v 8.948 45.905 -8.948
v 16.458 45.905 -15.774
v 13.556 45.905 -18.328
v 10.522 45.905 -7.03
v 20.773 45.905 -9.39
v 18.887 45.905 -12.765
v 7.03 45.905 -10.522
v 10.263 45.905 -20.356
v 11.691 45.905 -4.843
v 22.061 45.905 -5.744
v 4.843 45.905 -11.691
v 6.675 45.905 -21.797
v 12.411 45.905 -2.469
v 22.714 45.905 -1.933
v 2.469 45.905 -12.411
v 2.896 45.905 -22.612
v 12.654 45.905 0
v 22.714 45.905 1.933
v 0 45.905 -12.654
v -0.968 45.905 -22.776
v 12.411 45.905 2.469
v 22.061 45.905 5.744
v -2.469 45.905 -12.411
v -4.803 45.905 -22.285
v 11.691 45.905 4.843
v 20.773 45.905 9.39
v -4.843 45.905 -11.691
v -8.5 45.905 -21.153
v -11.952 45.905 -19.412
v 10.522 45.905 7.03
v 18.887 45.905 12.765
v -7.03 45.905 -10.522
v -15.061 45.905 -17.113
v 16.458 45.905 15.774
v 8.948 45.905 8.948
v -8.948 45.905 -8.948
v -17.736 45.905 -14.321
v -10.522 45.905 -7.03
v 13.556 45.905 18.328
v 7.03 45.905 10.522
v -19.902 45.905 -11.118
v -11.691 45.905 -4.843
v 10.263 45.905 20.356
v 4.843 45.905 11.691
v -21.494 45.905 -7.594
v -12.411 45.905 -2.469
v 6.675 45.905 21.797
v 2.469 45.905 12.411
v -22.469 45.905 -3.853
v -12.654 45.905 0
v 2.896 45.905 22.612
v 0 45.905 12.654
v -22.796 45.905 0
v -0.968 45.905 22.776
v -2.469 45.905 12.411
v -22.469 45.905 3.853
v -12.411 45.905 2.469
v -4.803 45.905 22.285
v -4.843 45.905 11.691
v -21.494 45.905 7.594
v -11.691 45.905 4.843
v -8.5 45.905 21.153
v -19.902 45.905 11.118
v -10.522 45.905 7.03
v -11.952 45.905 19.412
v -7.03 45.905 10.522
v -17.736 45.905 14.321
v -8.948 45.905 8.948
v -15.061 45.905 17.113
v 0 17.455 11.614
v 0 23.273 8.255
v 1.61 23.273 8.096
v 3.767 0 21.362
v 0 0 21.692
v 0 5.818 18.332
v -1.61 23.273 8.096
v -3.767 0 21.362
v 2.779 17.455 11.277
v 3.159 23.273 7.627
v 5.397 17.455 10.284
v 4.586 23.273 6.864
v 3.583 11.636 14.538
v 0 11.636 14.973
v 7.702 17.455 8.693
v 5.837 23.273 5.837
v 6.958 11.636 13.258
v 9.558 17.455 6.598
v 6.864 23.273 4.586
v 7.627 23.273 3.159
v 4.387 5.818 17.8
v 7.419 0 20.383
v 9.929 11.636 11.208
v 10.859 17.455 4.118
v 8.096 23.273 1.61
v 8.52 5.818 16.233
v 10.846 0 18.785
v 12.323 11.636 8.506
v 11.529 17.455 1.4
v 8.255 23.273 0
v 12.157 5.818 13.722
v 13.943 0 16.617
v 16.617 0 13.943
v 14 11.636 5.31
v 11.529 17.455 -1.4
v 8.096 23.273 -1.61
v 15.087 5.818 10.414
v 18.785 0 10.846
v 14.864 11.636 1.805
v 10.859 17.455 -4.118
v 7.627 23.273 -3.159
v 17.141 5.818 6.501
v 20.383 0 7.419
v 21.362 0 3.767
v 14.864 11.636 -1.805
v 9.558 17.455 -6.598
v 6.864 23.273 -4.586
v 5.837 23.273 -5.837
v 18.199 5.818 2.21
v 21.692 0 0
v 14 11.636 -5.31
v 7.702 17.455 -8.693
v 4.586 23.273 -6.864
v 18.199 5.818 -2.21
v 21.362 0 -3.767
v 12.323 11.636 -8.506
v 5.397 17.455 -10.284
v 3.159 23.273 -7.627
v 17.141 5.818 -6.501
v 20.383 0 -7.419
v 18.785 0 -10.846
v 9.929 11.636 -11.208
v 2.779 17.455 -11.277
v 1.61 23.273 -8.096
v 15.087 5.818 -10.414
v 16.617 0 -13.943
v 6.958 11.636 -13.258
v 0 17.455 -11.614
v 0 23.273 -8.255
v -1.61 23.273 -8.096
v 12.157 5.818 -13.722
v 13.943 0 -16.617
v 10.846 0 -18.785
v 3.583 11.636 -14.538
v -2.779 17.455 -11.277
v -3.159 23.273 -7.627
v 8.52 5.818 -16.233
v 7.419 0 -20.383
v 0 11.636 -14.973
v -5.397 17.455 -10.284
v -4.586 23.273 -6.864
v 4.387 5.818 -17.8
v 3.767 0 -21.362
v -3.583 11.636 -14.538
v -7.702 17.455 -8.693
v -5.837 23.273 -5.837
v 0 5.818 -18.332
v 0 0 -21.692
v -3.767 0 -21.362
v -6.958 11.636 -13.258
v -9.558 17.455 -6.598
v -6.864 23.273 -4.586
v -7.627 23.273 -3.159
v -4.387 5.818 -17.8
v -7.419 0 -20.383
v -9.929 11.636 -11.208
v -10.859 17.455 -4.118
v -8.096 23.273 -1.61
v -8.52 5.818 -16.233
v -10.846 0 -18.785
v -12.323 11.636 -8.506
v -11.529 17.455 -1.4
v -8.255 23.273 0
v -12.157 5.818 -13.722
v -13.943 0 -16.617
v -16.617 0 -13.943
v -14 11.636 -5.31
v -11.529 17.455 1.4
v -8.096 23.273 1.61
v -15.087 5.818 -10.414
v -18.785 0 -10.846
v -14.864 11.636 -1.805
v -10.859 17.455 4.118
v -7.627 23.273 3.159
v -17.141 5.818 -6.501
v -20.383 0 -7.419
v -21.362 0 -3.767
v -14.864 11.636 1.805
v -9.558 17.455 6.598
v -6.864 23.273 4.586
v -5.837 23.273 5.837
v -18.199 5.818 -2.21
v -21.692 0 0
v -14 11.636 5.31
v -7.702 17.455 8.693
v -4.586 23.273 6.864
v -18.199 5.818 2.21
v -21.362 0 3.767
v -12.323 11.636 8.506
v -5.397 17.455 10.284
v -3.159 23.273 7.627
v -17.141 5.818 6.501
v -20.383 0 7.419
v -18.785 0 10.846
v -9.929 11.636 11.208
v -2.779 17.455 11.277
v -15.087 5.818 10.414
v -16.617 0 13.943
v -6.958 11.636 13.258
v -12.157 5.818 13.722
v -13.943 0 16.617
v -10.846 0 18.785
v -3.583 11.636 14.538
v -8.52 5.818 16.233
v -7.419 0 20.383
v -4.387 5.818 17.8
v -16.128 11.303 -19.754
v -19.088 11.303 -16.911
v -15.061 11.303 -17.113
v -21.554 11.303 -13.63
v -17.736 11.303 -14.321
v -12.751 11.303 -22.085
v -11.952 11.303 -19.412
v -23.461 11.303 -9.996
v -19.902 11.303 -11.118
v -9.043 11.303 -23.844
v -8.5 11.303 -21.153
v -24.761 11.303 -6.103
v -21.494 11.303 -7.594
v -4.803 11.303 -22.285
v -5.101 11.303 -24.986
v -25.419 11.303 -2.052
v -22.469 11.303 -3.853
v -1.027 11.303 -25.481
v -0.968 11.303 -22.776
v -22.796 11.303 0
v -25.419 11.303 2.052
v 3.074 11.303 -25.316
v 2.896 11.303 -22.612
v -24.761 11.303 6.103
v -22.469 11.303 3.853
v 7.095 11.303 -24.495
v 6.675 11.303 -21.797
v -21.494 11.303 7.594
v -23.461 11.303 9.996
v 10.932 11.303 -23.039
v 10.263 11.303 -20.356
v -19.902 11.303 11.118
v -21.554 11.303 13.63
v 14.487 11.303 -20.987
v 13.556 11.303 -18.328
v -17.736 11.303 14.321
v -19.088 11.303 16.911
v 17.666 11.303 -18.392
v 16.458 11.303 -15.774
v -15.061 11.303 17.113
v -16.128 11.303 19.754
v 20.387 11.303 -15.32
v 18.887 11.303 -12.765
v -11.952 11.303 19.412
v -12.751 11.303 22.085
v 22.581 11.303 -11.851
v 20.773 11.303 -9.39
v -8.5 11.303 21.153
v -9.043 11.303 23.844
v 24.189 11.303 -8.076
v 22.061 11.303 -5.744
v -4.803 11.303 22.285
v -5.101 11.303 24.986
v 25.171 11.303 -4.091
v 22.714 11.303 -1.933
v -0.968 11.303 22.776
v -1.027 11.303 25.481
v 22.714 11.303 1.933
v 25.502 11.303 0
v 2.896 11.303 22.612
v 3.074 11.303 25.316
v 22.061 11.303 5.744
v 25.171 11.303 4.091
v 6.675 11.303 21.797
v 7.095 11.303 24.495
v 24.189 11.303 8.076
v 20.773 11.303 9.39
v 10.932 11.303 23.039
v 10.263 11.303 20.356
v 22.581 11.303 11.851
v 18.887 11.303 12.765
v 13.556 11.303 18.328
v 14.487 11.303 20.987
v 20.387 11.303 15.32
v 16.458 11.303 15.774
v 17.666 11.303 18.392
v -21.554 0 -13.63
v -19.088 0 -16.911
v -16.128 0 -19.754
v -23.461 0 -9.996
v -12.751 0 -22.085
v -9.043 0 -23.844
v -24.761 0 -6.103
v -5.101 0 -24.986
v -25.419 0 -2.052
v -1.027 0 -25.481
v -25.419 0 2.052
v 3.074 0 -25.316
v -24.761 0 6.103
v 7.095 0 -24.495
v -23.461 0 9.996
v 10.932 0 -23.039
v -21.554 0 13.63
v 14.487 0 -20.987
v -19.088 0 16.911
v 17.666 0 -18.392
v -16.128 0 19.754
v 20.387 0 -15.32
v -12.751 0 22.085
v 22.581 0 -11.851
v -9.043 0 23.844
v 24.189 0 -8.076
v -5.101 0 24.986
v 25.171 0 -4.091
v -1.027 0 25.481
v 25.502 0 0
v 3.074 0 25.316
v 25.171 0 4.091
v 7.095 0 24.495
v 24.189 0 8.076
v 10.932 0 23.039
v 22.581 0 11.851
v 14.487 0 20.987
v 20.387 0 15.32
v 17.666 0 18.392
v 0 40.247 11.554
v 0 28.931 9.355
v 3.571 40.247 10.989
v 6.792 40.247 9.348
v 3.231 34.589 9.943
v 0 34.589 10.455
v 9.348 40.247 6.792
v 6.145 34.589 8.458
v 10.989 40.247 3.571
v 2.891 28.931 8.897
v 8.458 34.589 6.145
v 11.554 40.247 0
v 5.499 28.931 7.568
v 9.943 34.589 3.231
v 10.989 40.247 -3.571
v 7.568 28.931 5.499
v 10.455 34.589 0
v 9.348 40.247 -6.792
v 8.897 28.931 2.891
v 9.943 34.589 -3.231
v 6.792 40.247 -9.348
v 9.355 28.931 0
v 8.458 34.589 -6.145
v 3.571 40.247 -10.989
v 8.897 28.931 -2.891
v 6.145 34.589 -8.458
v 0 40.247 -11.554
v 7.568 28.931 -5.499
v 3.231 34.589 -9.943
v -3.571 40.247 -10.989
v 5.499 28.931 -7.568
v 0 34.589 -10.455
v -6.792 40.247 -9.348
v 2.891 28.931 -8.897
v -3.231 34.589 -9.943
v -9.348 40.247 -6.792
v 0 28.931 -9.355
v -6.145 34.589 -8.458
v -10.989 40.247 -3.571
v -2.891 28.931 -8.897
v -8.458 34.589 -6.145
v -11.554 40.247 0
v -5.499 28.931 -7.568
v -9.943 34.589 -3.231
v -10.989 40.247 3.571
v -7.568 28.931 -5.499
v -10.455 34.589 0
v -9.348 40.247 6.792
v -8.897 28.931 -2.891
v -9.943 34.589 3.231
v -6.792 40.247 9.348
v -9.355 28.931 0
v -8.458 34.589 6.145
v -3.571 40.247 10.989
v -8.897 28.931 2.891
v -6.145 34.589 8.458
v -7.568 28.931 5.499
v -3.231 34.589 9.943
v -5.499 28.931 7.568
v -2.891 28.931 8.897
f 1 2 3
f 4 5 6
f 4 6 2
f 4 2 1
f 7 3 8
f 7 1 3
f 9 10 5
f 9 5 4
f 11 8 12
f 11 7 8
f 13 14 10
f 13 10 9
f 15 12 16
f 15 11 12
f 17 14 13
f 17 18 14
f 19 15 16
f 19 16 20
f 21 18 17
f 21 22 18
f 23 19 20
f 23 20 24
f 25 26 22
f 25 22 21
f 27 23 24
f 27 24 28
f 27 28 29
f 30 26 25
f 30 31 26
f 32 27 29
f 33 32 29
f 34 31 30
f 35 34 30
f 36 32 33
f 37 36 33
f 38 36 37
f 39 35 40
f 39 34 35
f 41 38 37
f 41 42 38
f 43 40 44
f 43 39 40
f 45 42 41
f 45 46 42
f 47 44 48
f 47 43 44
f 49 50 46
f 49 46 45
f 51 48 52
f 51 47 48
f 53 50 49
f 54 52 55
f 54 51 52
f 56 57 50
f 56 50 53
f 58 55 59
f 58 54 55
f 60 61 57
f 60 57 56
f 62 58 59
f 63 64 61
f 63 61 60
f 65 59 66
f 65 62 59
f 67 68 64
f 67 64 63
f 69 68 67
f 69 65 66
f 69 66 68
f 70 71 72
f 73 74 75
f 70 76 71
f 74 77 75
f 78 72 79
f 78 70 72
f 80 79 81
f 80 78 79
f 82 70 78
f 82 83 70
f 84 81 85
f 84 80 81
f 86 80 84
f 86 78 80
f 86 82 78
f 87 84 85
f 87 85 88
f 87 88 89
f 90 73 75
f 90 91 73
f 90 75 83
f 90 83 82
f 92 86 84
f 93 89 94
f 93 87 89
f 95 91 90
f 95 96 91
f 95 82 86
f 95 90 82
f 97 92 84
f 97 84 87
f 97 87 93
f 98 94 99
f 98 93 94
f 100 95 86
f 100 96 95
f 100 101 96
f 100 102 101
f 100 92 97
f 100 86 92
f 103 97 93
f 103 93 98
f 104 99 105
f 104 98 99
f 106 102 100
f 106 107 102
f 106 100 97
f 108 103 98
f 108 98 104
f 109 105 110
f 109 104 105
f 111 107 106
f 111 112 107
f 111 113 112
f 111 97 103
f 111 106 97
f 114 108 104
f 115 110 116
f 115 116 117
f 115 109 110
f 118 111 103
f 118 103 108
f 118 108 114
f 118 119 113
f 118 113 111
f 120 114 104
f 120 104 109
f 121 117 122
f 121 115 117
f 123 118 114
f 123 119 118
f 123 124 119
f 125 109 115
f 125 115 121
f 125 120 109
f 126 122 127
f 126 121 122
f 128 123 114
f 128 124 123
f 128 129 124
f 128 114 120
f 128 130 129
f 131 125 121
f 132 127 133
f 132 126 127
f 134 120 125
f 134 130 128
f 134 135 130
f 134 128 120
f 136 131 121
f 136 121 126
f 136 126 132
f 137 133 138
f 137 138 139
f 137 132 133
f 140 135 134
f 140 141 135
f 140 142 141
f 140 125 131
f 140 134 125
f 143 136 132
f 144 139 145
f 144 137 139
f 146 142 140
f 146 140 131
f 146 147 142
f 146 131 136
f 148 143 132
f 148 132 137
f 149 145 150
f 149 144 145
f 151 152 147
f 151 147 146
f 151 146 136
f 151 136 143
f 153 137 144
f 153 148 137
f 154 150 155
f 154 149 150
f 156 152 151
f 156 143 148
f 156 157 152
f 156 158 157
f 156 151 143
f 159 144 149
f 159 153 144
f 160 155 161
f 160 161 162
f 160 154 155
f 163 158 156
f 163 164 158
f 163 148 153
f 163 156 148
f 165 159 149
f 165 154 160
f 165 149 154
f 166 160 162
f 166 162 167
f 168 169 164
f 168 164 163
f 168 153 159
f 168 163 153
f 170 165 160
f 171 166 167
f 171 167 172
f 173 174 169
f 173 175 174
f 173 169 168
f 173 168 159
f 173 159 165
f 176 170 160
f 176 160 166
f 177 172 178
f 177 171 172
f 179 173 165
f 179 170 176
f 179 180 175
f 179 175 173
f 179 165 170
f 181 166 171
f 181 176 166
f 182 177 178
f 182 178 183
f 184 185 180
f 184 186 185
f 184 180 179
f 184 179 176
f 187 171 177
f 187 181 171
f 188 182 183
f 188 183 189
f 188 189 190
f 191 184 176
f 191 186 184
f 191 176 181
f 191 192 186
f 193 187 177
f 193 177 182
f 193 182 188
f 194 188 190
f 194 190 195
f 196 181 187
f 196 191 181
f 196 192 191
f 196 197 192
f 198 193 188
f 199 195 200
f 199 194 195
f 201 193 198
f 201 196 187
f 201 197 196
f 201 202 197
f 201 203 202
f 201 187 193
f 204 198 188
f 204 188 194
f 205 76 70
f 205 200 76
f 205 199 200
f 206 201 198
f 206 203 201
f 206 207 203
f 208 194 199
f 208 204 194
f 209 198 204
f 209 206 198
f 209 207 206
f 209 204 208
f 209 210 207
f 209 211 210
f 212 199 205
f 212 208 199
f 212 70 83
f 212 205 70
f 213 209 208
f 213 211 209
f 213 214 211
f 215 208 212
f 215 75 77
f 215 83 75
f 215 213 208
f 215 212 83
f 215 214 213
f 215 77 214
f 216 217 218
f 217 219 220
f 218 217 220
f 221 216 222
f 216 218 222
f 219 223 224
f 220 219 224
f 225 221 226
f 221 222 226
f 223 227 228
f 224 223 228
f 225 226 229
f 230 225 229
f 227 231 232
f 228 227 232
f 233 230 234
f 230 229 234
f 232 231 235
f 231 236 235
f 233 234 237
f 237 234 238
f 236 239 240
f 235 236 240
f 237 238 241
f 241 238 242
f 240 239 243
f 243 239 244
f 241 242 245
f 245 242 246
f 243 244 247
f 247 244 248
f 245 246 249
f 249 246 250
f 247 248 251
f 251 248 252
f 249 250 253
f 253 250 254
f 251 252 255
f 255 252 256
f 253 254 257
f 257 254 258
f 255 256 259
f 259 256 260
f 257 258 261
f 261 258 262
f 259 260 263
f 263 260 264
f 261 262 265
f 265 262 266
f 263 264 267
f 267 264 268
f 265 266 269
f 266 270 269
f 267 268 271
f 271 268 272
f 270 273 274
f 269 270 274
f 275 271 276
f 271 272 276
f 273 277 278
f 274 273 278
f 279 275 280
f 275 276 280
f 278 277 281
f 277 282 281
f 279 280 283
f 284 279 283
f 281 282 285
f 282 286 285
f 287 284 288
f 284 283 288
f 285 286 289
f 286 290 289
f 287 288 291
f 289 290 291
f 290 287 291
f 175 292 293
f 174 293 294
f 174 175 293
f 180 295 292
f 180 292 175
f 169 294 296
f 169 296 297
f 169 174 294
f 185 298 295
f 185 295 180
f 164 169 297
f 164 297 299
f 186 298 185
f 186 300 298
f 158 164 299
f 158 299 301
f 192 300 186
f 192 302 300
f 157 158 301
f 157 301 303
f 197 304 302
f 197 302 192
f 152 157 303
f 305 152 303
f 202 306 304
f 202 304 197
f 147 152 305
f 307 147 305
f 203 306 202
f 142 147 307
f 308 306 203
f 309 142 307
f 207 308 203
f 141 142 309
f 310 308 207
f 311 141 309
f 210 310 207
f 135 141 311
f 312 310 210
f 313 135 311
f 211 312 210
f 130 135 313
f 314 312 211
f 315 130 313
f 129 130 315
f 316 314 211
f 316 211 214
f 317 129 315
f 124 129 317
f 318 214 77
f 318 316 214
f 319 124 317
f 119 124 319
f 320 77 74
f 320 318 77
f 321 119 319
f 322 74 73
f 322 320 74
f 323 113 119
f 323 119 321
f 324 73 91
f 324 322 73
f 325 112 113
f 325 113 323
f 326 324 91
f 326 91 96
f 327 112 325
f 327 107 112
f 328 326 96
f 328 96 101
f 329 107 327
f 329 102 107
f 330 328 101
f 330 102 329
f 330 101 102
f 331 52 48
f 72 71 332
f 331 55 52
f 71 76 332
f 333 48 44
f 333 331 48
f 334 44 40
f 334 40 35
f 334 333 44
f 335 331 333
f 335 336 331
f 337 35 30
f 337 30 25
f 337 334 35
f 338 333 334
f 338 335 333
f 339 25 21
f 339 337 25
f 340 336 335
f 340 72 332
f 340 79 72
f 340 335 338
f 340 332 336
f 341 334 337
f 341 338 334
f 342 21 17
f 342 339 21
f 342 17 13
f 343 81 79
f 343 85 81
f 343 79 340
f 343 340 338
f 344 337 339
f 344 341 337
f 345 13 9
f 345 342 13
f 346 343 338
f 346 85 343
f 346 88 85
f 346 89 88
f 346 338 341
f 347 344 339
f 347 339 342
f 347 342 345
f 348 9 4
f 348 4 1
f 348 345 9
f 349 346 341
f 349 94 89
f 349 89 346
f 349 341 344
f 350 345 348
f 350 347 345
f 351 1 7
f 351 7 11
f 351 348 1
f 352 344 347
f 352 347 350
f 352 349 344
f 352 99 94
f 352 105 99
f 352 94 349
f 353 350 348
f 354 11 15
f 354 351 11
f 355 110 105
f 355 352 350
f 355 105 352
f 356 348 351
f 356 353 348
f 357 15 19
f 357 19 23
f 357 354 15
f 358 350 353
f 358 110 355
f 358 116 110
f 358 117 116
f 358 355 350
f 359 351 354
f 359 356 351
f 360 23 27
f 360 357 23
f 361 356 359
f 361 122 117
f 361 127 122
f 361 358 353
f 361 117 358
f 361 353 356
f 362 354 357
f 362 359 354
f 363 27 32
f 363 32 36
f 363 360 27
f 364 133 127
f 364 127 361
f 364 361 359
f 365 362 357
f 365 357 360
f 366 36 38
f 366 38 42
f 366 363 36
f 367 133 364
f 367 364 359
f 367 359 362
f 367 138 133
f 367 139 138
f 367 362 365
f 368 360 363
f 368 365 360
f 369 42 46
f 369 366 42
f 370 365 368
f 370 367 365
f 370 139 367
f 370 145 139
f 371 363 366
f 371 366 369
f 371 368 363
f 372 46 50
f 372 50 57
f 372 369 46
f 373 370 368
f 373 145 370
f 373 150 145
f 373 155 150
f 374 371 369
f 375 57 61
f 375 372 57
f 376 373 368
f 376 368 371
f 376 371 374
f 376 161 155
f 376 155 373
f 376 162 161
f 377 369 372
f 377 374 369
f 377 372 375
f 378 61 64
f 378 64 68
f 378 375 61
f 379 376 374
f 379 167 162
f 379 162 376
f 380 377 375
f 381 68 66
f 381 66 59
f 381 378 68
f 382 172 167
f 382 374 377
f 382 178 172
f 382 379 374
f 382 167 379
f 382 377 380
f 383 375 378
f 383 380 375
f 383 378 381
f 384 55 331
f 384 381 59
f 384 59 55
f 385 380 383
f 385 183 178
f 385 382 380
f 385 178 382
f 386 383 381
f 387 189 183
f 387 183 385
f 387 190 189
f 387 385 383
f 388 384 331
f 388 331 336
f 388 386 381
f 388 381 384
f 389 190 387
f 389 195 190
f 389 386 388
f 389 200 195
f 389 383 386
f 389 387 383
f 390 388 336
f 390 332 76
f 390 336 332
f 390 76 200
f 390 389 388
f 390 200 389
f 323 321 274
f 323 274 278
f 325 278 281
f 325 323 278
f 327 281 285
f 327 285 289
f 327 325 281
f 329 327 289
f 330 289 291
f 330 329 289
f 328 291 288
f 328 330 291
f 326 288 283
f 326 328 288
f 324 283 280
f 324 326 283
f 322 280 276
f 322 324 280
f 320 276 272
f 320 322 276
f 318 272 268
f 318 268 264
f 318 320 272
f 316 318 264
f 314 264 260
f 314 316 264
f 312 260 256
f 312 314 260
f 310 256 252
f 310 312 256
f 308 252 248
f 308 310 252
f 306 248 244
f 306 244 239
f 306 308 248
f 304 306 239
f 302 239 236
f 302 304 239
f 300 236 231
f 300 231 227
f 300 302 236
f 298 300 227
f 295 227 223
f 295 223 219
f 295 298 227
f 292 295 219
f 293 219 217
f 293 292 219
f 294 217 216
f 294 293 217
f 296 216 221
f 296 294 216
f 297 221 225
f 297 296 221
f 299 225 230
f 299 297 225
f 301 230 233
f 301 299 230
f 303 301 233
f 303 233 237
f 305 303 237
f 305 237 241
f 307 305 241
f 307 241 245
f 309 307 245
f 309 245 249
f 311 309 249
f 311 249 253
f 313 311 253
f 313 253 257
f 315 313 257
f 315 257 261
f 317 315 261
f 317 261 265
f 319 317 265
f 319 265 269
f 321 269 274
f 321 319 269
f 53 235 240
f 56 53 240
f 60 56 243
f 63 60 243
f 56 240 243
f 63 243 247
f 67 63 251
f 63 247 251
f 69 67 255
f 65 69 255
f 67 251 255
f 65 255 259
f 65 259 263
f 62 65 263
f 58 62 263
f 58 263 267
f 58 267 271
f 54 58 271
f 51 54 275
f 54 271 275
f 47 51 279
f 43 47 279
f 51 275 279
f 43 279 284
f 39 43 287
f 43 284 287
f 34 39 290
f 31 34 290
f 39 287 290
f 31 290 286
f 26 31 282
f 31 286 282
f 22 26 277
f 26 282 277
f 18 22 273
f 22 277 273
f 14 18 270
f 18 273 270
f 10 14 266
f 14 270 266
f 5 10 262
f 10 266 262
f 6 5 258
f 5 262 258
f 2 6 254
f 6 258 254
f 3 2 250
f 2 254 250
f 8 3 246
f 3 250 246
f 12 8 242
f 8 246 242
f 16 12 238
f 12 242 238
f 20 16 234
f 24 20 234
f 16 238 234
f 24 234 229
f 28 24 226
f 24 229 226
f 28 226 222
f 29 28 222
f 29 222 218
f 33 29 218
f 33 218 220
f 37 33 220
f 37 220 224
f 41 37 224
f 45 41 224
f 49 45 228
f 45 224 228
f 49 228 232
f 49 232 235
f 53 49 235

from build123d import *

# Parameters (mm, degrees)
F0_R     = 25.5016
F1_DEPTH = 11.303
F2_R     = 22.7965
F5_DEPTH = 34.6022074724
F4_W     = 22.6323335914
F4_H     = 8.255


with BuildPart() as f1:
    # F0 (on Front) → F1 (new body)
    with BuildSketch(Plane.XZ):
        Circle(F0_R)
    extrude(amount=-F1_DEPTH)

    # F2 (on face) → F5 (join, through all)
    with BuildSketch(Plane(origin=(0, 11.303, 0), x_dir=(-1, 0, 0), z_dir=(0, 1, 0))):
        Circle(F2_R)
    extrude(amount=F5_DEPTH)

    # F4 (on Right) → F6 (revolve, cut)
    with BuildSketch(Plane.YZ):
        Polygon((0, 21.6916), (0, 0), (23.272873881, 0), (23.272873881, 8.255), align=None)
        with Locations((34.5890406767, 4.1275)):
            Rectangle(F4_W, F4_H)
        Polygon((45.9052074724, 12.65428), (23.272873881, 8.255), (45.9052074724, 8.255), align=None)
    revolve(axis=Axis((0, 11.6364369405, 0), (0, 1, 0)), mode=Mode.SUBTRACT)


solid = f1.part
